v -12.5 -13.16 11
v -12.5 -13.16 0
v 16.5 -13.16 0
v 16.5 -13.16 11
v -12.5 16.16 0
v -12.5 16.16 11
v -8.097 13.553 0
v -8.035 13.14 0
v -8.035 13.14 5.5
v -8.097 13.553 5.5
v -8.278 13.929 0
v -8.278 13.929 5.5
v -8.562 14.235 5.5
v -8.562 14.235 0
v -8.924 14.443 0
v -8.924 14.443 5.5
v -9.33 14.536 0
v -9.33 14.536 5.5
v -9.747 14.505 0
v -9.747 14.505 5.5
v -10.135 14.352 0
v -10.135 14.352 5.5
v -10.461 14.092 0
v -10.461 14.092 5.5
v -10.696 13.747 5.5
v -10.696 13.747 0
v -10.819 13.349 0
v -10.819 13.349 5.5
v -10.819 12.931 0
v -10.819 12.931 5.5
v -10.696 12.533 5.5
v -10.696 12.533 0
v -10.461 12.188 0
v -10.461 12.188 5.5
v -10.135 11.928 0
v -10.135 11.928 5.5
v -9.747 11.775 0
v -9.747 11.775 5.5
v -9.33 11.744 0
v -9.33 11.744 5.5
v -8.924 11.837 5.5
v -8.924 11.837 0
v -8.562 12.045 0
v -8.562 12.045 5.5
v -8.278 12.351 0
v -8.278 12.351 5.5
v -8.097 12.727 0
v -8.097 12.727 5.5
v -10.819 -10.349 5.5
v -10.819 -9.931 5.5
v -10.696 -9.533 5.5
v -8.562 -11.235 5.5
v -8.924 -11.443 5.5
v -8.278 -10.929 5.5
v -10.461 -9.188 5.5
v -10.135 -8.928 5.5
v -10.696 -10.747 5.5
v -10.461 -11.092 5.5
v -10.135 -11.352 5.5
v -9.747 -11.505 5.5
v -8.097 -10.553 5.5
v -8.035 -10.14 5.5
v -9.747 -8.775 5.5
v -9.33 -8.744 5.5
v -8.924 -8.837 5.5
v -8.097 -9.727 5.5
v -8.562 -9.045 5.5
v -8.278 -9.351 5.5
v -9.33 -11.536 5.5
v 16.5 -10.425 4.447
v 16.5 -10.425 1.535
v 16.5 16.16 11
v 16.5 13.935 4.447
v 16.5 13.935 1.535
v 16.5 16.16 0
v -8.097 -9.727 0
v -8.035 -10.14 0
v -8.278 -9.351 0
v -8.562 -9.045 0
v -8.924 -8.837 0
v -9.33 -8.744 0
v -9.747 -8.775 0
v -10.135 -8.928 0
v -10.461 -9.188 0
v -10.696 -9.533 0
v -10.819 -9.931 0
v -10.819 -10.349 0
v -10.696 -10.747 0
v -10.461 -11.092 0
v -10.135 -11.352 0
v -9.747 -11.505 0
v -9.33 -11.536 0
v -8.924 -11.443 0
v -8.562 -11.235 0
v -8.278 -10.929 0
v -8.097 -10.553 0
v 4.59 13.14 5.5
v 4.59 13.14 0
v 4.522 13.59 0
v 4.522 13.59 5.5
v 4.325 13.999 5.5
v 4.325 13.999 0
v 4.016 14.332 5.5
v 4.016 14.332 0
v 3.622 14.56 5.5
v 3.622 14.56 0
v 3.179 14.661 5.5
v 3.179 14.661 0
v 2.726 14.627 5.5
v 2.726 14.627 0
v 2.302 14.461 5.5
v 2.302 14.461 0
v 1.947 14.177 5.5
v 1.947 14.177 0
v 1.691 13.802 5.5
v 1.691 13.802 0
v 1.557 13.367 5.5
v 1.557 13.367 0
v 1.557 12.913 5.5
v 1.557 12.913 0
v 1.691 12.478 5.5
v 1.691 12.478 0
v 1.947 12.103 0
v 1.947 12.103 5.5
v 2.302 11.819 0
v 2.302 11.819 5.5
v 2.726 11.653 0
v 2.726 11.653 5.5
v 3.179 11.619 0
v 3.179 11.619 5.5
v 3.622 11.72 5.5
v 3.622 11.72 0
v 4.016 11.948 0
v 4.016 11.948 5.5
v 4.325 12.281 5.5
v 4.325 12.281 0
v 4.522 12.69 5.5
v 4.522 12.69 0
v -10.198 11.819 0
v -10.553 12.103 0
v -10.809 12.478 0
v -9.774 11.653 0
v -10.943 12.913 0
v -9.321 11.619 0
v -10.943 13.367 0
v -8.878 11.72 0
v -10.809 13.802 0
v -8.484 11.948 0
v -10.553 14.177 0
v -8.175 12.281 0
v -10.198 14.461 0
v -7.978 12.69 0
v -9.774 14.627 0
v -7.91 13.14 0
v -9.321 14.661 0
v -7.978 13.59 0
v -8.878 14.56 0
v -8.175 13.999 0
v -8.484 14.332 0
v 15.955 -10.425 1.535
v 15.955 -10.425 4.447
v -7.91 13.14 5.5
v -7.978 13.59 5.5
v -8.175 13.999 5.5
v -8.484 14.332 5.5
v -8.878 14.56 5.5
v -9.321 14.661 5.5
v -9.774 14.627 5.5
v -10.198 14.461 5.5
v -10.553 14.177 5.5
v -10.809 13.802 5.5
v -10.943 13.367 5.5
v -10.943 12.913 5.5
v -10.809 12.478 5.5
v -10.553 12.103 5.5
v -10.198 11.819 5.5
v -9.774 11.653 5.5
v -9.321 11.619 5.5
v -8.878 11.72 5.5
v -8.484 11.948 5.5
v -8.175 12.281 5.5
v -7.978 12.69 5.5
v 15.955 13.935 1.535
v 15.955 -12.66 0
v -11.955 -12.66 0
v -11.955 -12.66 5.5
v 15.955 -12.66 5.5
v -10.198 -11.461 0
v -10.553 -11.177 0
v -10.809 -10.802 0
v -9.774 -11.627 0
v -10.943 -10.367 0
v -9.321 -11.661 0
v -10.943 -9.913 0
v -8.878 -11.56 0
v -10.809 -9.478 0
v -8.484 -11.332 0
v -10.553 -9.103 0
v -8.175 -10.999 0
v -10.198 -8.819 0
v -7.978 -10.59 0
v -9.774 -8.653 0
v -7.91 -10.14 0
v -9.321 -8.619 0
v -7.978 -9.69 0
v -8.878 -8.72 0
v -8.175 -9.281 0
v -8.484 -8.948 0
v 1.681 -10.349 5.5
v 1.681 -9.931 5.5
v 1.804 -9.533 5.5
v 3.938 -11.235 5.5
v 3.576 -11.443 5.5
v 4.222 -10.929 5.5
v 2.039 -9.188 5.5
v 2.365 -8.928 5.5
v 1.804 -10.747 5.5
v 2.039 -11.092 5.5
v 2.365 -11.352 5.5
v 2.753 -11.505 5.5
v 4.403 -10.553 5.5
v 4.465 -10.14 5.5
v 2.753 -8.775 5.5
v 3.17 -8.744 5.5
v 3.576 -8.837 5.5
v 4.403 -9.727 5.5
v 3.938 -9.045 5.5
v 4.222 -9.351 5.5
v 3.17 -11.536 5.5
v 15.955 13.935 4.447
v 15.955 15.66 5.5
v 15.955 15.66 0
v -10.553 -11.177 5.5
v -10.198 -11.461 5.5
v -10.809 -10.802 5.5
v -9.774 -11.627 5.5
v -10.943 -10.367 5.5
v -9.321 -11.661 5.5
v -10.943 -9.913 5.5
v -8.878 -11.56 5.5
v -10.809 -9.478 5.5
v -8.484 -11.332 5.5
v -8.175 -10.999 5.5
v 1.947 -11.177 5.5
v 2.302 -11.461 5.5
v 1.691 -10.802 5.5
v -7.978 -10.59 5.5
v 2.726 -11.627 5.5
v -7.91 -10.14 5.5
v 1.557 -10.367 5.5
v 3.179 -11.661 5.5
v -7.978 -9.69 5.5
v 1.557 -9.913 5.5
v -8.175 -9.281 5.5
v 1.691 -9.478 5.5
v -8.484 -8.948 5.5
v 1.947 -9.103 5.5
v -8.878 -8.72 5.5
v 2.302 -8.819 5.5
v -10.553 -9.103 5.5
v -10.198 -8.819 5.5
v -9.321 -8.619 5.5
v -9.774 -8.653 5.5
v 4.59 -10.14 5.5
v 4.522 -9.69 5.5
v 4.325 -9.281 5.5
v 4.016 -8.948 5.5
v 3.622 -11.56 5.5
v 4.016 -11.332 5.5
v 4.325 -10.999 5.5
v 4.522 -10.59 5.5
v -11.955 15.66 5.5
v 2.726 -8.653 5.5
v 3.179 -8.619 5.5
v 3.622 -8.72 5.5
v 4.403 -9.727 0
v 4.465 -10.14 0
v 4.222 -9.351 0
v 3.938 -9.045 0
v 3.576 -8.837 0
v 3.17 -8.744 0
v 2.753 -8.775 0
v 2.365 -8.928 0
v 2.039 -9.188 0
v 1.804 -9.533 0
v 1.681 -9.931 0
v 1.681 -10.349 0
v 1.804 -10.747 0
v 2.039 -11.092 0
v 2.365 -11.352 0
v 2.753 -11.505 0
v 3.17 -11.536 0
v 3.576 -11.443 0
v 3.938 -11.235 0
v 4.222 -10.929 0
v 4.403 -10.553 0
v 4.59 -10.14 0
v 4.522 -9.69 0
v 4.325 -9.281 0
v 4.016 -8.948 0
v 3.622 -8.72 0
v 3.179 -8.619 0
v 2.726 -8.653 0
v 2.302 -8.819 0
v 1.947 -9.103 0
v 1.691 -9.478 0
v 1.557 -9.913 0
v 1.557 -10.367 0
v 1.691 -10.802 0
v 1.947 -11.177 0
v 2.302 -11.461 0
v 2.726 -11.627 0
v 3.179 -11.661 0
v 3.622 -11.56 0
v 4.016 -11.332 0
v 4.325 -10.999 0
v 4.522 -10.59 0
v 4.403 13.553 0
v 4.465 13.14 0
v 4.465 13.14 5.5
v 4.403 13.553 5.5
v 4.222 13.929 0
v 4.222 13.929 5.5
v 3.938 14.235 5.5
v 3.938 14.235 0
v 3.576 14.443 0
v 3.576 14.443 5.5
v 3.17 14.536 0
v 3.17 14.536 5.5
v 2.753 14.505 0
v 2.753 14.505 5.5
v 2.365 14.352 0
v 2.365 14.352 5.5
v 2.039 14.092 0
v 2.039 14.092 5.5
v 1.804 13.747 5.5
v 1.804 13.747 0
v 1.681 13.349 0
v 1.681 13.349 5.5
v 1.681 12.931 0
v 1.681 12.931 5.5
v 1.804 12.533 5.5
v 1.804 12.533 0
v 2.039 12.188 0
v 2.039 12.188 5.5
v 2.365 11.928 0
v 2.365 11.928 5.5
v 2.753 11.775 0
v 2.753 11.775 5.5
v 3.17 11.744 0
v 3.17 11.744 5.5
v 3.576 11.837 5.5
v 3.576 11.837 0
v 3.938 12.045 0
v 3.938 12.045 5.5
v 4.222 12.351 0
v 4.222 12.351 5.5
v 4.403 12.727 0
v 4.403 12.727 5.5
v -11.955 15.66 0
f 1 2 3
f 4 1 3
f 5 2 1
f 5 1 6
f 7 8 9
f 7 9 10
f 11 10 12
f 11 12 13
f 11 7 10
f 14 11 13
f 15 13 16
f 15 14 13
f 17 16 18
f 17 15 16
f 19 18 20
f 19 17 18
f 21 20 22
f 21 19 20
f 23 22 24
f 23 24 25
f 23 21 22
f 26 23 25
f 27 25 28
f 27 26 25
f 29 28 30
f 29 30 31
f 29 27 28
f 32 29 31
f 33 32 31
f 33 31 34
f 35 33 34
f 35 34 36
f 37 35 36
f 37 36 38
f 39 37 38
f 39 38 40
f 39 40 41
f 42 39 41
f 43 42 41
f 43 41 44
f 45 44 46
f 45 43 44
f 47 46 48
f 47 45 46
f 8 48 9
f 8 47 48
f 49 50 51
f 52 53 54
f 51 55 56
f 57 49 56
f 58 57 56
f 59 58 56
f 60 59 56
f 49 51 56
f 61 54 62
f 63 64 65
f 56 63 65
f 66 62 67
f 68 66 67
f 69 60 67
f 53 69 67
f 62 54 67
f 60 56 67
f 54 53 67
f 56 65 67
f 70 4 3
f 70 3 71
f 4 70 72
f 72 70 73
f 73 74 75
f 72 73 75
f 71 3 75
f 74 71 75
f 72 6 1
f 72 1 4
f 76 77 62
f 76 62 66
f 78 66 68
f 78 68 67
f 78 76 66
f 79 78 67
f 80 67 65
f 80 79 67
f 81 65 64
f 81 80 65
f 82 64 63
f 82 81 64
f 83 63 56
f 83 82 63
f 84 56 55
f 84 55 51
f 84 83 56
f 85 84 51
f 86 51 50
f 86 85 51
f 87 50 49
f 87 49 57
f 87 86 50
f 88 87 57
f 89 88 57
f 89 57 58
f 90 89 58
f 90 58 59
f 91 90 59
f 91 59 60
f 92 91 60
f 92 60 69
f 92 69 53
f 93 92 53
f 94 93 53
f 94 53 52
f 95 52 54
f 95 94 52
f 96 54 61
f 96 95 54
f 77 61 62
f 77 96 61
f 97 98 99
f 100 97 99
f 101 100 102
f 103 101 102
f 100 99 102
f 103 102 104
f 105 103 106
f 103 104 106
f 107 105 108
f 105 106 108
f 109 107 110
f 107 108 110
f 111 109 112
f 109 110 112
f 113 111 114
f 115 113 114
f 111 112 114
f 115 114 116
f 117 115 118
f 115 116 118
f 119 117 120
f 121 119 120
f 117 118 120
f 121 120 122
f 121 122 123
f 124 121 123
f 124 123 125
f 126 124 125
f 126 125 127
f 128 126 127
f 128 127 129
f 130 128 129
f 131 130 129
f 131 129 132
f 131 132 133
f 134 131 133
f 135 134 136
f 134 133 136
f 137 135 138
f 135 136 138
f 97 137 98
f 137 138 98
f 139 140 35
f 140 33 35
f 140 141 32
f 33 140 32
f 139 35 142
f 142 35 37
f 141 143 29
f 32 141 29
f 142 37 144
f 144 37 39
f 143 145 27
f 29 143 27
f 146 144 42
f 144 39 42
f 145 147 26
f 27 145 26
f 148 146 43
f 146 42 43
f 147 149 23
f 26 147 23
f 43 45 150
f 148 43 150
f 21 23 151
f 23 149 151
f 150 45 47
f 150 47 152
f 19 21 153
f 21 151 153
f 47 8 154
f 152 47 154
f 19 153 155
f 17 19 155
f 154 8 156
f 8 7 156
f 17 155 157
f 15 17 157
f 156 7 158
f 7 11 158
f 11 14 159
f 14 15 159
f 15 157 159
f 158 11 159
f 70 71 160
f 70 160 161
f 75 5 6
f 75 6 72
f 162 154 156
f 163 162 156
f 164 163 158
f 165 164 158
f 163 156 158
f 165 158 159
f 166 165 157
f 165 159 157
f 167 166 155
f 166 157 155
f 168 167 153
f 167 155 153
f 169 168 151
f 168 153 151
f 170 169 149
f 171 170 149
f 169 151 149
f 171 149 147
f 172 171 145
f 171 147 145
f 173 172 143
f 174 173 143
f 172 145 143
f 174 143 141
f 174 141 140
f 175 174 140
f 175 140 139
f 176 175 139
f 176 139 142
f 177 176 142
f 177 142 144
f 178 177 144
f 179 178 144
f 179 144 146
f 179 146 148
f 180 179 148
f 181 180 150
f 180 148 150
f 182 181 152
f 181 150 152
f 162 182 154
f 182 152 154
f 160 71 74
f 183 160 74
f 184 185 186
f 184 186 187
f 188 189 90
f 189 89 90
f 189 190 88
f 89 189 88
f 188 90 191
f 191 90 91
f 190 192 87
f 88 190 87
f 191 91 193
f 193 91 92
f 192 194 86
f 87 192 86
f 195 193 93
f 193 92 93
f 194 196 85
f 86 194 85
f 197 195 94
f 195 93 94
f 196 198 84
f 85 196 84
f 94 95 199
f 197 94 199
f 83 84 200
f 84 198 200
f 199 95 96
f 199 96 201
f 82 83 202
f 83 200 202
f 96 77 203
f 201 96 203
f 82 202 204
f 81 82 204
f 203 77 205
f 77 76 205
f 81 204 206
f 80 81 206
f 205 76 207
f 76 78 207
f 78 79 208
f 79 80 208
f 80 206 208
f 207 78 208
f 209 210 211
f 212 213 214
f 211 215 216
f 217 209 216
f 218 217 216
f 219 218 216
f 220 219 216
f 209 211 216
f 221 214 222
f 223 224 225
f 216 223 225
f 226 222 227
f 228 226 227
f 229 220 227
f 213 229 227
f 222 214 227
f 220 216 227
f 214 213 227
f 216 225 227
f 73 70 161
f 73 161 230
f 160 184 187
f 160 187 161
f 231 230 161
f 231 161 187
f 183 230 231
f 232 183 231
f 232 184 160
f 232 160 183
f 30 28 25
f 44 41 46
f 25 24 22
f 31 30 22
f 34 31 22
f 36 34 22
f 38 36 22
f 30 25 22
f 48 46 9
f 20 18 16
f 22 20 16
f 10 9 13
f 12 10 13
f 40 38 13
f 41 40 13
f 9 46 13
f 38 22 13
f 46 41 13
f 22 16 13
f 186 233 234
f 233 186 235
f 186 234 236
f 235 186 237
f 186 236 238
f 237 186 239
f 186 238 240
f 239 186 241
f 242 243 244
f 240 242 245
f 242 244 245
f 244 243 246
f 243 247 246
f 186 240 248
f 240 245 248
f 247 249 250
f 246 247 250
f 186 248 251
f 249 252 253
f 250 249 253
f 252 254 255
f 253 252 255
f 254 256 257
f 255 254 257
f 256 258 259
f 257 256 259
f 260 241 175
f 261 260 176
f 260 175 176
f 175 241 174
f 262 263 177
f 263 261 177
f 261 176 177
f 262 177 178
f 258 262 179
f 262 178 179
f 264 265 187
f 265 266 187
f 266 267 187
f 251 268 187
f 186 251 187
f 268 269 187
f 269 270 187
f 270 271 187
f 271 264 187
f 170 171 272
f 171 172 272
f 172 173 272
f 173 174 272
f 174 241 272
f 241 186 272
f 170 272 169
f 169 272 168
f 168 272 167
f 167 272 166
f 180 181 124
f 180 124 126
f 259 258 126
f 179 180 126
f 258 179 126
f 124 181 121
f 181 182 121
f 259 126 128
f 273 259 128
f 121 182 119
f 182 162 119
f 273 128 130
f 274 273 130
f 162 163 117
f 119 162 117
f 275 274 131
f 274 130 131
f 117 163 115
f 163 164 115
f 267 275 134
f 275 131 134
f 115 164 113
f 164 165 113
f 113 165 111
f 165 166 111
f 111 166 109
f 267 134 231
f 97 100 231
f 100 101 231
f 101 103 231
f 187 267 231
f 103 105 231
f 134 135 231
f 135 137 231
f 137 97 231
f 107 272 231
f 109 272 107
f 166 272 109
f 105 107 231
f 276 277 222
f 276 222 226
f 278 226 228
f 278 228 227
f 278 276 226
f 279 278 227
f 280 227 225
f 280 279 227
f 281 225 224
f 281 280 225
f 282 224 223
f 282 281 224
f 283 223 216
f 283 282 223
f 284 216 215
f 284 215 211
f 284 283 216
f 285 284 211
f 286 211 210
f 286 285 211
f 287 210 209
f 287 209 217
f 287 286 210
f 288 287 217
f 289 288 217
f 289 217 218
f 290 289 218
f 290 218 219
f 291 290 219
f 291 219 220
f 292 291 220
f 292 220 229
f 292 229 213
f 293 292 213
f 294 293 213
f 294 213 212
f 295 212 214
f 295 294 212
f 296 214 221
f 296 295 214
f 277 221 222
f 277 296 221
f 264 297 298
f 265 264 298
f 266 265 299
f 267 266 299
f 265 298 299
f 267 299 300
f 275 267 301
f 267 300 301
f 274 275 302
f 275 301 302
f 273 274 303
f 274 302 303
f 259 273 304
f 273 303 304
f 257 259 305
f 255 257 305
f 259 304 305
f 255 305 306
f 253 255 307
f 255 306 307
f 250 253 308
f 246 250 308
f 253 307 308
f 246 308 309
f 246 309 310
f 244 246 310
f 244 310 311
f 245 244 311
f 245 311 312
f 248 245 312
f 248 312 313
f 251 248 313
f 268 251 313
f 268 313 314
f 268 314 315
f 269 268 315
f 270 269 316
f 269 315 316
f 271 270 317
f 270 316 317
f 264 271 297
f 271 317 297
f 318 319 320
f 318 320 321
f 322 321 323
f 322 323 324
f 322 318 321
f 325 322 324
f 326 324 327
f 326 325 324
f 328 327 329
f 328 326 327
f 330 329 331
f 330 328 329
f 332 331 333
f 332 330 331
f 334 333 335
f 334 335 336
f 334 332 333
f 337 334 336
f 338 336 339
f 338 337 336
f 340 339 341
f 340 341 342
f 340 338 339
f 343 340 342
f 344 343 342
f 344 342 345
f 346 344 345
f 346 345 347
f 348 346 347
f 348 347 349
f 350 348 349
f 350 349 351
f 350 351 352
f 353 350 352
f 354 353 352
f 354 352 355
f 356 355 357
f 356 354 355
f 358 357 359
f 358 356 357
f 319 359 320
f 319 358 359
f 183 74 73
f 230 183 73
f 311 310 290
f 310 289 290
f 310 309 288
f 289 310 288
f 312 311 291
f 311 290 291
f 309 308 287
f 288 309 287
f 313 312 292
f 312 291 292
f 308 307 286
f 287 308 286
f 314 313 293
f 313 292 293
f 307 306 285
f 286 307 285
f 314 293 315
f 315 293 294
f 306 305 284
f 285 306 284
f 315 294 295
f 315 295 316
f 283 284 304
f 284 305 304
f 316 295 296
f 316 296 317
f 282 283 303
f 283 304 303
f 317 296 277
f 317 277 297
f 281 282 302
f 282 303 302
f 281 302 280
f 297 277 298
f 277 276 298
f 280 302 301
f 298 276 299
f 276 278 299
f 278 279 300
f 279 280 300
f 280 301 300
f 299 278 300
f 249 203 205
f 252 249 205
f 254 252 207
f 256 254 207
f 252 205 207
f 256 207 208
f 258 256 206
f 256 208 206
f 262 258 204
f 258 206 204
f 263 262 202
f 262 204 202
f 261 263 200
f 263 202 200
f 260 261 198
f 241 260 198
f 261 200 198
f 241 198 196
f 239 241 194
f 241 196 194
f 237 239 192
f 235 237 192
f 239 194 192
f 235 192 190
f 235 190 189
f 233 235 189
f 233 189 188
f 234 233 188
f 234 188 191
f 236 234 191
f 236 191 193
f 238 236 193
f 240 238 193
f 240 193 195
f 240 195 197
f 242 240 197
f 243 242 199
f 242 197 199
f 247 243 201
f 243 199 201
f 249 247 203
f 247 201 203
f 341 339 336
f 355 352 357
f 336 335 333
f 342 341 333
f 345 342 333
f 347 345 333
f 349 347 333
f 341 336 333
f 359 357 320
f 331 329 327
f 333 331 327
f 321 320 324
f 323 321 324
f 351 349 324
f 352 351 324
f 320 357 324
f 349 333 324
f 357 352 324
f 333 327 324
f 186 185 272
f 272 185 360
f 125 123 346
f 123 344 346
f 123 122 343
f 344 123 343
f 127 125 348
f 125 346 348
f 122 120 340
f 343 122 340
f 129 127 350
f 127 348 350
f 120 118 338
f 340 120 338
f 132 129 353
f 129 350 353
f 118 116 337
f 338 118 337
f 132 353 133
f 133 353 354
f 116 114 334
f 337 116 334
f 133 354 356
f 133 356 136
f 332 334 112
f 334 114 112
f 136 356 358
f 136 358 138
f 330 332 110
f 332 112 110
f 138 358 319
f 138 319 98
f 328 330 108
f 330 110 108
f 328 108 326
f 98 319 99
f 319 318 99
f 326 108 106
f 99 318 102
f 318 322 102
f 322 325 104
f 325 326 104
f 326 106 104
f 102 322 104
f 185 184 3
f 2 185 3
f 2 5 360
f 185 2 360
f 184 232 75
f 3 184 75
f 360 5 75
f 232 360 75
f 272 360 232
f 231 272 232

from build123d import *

# Parameters (mm, degrees)
F0_W     = 29
F0_H     = 29.32
F0_W_2   = 27.91
F0_H_2   = 28.32
F0_R     = 1.525
F0_R_2   = 1.4
F1_DEPTH = 11
F2_DEPTH = 5.5
F3_W     = 24.3599908426
F3_H     = 2.9126071604
F4_DEPTH = 10


with BuildPart() as f1:
    # F0 (on Top) → F1 (new body)
    with BuildSketch(Plane.XY):
        with Locations((2, 1.5)):
            Rectangle(F0_W, F0_H)
        with Locations((2, 1.5)):
            Rectangle(F0_W_2, F0_H_2, mode=Mode.SUBTRACT)
        with Locations((2, 1.5)):
            Rectangle(F0_W_2, F0_H_2)
        with Locations((-9.435, -10.14)):
            Circle(F0_R, mode=Mode.SUBTRACT)
        with Locations((3.065, -10.14)):
            Circle(F0_R, mode=Mode.SUBTRACT)
        with Locations((-9.435, 13.14)):
            Circle(F0_R, mode=Mode.SUBTRACT)
        with Locations((3.065, 13.14)):
            Circle(F0_R, mode=Mode.SUBTRACT)
        with Locations((3.065, 13.14)):
            Circle(F0_R)
        with Locations((3.065, 13.14)):
            Circle(F0_R_2, mode=Mode.SUBTRACT)
        with Locations((3.065, -10.14)):
            Circle(F0_R)
        with Locations((3.065, -10.14)):
            Circle(F0_R_2, mode=Mode.SUBTRACT)
        with Locations((-9.435, -10.14)):
            Circle(F0_R)
        with Locations((-9.435, -10.14)):
            Circle(F0_R_2, mode=Mode.SUBTRACT)
        with Locations((-9.435, 13.14)):
            Circle(F0_R)
        with Locations((-9.435, 13.14)):
            Circle(F0_R_2, mode=Mode.SUBTRACT)
        with Locations((3.065, 13.14)):
            Circle(F0_R_2)
        with Locations((3.065, -10.14)):
            Circle(F0_R_2)
        with Locations((-9.435, -10.14)):
            Circle(F0_R_2)
        with Locations((-9.435, 13.14)):
            Circle(F0_R_2)
    extrude(amount=F1_DEPTH)

    # F0 (on Top) → F2 (cut)
    with BuildSketch(Plane.XY):
        with Locations((2, 1.5)):
            Rectangle(F0_W_2, F0_H_2)
        with Locations((-9.435, -10.14)):
            Circle(F0_R, mode=Mode.SUBTRACT)
        with Locations((3.065, -10.14)):
            Circle(F0_R, mode=Mode.SUBTRACT)
        with Locations((-9.435, 13.14)):
            Circle(F0_R, mode=Mode.SUBTRACT)
        with Locations((3.065, 13.14)):
            Circle(F0_R, mode=Mode.SUBTRACT)
        with Locations((-9.435, -10.14)):
            Circle(F0_R_2)
        with Locations((3.065, -10.14)):
            Circle(F0_R_2)
        with Locations((3.065, 13.14)):
            Circle(F0_R_2)
        with Locations((-9.435, 13.14)):
            Circle(F0_R_2)
    extrude(amount=F2_DEPTH, mode=Mode.SUBTRACT)

    # F3 (on face) → F4 (cut)
    with BuildSketch(Plane.YZ.offset(16.5)):
        with Locations((1.7549390905, 2.9909135192)):
            Rectangle(F3_W, F3_H)
    extrude(amount=-F4_DEPTH, mode=Mode.SUBTRACT)


solid = f1.part
